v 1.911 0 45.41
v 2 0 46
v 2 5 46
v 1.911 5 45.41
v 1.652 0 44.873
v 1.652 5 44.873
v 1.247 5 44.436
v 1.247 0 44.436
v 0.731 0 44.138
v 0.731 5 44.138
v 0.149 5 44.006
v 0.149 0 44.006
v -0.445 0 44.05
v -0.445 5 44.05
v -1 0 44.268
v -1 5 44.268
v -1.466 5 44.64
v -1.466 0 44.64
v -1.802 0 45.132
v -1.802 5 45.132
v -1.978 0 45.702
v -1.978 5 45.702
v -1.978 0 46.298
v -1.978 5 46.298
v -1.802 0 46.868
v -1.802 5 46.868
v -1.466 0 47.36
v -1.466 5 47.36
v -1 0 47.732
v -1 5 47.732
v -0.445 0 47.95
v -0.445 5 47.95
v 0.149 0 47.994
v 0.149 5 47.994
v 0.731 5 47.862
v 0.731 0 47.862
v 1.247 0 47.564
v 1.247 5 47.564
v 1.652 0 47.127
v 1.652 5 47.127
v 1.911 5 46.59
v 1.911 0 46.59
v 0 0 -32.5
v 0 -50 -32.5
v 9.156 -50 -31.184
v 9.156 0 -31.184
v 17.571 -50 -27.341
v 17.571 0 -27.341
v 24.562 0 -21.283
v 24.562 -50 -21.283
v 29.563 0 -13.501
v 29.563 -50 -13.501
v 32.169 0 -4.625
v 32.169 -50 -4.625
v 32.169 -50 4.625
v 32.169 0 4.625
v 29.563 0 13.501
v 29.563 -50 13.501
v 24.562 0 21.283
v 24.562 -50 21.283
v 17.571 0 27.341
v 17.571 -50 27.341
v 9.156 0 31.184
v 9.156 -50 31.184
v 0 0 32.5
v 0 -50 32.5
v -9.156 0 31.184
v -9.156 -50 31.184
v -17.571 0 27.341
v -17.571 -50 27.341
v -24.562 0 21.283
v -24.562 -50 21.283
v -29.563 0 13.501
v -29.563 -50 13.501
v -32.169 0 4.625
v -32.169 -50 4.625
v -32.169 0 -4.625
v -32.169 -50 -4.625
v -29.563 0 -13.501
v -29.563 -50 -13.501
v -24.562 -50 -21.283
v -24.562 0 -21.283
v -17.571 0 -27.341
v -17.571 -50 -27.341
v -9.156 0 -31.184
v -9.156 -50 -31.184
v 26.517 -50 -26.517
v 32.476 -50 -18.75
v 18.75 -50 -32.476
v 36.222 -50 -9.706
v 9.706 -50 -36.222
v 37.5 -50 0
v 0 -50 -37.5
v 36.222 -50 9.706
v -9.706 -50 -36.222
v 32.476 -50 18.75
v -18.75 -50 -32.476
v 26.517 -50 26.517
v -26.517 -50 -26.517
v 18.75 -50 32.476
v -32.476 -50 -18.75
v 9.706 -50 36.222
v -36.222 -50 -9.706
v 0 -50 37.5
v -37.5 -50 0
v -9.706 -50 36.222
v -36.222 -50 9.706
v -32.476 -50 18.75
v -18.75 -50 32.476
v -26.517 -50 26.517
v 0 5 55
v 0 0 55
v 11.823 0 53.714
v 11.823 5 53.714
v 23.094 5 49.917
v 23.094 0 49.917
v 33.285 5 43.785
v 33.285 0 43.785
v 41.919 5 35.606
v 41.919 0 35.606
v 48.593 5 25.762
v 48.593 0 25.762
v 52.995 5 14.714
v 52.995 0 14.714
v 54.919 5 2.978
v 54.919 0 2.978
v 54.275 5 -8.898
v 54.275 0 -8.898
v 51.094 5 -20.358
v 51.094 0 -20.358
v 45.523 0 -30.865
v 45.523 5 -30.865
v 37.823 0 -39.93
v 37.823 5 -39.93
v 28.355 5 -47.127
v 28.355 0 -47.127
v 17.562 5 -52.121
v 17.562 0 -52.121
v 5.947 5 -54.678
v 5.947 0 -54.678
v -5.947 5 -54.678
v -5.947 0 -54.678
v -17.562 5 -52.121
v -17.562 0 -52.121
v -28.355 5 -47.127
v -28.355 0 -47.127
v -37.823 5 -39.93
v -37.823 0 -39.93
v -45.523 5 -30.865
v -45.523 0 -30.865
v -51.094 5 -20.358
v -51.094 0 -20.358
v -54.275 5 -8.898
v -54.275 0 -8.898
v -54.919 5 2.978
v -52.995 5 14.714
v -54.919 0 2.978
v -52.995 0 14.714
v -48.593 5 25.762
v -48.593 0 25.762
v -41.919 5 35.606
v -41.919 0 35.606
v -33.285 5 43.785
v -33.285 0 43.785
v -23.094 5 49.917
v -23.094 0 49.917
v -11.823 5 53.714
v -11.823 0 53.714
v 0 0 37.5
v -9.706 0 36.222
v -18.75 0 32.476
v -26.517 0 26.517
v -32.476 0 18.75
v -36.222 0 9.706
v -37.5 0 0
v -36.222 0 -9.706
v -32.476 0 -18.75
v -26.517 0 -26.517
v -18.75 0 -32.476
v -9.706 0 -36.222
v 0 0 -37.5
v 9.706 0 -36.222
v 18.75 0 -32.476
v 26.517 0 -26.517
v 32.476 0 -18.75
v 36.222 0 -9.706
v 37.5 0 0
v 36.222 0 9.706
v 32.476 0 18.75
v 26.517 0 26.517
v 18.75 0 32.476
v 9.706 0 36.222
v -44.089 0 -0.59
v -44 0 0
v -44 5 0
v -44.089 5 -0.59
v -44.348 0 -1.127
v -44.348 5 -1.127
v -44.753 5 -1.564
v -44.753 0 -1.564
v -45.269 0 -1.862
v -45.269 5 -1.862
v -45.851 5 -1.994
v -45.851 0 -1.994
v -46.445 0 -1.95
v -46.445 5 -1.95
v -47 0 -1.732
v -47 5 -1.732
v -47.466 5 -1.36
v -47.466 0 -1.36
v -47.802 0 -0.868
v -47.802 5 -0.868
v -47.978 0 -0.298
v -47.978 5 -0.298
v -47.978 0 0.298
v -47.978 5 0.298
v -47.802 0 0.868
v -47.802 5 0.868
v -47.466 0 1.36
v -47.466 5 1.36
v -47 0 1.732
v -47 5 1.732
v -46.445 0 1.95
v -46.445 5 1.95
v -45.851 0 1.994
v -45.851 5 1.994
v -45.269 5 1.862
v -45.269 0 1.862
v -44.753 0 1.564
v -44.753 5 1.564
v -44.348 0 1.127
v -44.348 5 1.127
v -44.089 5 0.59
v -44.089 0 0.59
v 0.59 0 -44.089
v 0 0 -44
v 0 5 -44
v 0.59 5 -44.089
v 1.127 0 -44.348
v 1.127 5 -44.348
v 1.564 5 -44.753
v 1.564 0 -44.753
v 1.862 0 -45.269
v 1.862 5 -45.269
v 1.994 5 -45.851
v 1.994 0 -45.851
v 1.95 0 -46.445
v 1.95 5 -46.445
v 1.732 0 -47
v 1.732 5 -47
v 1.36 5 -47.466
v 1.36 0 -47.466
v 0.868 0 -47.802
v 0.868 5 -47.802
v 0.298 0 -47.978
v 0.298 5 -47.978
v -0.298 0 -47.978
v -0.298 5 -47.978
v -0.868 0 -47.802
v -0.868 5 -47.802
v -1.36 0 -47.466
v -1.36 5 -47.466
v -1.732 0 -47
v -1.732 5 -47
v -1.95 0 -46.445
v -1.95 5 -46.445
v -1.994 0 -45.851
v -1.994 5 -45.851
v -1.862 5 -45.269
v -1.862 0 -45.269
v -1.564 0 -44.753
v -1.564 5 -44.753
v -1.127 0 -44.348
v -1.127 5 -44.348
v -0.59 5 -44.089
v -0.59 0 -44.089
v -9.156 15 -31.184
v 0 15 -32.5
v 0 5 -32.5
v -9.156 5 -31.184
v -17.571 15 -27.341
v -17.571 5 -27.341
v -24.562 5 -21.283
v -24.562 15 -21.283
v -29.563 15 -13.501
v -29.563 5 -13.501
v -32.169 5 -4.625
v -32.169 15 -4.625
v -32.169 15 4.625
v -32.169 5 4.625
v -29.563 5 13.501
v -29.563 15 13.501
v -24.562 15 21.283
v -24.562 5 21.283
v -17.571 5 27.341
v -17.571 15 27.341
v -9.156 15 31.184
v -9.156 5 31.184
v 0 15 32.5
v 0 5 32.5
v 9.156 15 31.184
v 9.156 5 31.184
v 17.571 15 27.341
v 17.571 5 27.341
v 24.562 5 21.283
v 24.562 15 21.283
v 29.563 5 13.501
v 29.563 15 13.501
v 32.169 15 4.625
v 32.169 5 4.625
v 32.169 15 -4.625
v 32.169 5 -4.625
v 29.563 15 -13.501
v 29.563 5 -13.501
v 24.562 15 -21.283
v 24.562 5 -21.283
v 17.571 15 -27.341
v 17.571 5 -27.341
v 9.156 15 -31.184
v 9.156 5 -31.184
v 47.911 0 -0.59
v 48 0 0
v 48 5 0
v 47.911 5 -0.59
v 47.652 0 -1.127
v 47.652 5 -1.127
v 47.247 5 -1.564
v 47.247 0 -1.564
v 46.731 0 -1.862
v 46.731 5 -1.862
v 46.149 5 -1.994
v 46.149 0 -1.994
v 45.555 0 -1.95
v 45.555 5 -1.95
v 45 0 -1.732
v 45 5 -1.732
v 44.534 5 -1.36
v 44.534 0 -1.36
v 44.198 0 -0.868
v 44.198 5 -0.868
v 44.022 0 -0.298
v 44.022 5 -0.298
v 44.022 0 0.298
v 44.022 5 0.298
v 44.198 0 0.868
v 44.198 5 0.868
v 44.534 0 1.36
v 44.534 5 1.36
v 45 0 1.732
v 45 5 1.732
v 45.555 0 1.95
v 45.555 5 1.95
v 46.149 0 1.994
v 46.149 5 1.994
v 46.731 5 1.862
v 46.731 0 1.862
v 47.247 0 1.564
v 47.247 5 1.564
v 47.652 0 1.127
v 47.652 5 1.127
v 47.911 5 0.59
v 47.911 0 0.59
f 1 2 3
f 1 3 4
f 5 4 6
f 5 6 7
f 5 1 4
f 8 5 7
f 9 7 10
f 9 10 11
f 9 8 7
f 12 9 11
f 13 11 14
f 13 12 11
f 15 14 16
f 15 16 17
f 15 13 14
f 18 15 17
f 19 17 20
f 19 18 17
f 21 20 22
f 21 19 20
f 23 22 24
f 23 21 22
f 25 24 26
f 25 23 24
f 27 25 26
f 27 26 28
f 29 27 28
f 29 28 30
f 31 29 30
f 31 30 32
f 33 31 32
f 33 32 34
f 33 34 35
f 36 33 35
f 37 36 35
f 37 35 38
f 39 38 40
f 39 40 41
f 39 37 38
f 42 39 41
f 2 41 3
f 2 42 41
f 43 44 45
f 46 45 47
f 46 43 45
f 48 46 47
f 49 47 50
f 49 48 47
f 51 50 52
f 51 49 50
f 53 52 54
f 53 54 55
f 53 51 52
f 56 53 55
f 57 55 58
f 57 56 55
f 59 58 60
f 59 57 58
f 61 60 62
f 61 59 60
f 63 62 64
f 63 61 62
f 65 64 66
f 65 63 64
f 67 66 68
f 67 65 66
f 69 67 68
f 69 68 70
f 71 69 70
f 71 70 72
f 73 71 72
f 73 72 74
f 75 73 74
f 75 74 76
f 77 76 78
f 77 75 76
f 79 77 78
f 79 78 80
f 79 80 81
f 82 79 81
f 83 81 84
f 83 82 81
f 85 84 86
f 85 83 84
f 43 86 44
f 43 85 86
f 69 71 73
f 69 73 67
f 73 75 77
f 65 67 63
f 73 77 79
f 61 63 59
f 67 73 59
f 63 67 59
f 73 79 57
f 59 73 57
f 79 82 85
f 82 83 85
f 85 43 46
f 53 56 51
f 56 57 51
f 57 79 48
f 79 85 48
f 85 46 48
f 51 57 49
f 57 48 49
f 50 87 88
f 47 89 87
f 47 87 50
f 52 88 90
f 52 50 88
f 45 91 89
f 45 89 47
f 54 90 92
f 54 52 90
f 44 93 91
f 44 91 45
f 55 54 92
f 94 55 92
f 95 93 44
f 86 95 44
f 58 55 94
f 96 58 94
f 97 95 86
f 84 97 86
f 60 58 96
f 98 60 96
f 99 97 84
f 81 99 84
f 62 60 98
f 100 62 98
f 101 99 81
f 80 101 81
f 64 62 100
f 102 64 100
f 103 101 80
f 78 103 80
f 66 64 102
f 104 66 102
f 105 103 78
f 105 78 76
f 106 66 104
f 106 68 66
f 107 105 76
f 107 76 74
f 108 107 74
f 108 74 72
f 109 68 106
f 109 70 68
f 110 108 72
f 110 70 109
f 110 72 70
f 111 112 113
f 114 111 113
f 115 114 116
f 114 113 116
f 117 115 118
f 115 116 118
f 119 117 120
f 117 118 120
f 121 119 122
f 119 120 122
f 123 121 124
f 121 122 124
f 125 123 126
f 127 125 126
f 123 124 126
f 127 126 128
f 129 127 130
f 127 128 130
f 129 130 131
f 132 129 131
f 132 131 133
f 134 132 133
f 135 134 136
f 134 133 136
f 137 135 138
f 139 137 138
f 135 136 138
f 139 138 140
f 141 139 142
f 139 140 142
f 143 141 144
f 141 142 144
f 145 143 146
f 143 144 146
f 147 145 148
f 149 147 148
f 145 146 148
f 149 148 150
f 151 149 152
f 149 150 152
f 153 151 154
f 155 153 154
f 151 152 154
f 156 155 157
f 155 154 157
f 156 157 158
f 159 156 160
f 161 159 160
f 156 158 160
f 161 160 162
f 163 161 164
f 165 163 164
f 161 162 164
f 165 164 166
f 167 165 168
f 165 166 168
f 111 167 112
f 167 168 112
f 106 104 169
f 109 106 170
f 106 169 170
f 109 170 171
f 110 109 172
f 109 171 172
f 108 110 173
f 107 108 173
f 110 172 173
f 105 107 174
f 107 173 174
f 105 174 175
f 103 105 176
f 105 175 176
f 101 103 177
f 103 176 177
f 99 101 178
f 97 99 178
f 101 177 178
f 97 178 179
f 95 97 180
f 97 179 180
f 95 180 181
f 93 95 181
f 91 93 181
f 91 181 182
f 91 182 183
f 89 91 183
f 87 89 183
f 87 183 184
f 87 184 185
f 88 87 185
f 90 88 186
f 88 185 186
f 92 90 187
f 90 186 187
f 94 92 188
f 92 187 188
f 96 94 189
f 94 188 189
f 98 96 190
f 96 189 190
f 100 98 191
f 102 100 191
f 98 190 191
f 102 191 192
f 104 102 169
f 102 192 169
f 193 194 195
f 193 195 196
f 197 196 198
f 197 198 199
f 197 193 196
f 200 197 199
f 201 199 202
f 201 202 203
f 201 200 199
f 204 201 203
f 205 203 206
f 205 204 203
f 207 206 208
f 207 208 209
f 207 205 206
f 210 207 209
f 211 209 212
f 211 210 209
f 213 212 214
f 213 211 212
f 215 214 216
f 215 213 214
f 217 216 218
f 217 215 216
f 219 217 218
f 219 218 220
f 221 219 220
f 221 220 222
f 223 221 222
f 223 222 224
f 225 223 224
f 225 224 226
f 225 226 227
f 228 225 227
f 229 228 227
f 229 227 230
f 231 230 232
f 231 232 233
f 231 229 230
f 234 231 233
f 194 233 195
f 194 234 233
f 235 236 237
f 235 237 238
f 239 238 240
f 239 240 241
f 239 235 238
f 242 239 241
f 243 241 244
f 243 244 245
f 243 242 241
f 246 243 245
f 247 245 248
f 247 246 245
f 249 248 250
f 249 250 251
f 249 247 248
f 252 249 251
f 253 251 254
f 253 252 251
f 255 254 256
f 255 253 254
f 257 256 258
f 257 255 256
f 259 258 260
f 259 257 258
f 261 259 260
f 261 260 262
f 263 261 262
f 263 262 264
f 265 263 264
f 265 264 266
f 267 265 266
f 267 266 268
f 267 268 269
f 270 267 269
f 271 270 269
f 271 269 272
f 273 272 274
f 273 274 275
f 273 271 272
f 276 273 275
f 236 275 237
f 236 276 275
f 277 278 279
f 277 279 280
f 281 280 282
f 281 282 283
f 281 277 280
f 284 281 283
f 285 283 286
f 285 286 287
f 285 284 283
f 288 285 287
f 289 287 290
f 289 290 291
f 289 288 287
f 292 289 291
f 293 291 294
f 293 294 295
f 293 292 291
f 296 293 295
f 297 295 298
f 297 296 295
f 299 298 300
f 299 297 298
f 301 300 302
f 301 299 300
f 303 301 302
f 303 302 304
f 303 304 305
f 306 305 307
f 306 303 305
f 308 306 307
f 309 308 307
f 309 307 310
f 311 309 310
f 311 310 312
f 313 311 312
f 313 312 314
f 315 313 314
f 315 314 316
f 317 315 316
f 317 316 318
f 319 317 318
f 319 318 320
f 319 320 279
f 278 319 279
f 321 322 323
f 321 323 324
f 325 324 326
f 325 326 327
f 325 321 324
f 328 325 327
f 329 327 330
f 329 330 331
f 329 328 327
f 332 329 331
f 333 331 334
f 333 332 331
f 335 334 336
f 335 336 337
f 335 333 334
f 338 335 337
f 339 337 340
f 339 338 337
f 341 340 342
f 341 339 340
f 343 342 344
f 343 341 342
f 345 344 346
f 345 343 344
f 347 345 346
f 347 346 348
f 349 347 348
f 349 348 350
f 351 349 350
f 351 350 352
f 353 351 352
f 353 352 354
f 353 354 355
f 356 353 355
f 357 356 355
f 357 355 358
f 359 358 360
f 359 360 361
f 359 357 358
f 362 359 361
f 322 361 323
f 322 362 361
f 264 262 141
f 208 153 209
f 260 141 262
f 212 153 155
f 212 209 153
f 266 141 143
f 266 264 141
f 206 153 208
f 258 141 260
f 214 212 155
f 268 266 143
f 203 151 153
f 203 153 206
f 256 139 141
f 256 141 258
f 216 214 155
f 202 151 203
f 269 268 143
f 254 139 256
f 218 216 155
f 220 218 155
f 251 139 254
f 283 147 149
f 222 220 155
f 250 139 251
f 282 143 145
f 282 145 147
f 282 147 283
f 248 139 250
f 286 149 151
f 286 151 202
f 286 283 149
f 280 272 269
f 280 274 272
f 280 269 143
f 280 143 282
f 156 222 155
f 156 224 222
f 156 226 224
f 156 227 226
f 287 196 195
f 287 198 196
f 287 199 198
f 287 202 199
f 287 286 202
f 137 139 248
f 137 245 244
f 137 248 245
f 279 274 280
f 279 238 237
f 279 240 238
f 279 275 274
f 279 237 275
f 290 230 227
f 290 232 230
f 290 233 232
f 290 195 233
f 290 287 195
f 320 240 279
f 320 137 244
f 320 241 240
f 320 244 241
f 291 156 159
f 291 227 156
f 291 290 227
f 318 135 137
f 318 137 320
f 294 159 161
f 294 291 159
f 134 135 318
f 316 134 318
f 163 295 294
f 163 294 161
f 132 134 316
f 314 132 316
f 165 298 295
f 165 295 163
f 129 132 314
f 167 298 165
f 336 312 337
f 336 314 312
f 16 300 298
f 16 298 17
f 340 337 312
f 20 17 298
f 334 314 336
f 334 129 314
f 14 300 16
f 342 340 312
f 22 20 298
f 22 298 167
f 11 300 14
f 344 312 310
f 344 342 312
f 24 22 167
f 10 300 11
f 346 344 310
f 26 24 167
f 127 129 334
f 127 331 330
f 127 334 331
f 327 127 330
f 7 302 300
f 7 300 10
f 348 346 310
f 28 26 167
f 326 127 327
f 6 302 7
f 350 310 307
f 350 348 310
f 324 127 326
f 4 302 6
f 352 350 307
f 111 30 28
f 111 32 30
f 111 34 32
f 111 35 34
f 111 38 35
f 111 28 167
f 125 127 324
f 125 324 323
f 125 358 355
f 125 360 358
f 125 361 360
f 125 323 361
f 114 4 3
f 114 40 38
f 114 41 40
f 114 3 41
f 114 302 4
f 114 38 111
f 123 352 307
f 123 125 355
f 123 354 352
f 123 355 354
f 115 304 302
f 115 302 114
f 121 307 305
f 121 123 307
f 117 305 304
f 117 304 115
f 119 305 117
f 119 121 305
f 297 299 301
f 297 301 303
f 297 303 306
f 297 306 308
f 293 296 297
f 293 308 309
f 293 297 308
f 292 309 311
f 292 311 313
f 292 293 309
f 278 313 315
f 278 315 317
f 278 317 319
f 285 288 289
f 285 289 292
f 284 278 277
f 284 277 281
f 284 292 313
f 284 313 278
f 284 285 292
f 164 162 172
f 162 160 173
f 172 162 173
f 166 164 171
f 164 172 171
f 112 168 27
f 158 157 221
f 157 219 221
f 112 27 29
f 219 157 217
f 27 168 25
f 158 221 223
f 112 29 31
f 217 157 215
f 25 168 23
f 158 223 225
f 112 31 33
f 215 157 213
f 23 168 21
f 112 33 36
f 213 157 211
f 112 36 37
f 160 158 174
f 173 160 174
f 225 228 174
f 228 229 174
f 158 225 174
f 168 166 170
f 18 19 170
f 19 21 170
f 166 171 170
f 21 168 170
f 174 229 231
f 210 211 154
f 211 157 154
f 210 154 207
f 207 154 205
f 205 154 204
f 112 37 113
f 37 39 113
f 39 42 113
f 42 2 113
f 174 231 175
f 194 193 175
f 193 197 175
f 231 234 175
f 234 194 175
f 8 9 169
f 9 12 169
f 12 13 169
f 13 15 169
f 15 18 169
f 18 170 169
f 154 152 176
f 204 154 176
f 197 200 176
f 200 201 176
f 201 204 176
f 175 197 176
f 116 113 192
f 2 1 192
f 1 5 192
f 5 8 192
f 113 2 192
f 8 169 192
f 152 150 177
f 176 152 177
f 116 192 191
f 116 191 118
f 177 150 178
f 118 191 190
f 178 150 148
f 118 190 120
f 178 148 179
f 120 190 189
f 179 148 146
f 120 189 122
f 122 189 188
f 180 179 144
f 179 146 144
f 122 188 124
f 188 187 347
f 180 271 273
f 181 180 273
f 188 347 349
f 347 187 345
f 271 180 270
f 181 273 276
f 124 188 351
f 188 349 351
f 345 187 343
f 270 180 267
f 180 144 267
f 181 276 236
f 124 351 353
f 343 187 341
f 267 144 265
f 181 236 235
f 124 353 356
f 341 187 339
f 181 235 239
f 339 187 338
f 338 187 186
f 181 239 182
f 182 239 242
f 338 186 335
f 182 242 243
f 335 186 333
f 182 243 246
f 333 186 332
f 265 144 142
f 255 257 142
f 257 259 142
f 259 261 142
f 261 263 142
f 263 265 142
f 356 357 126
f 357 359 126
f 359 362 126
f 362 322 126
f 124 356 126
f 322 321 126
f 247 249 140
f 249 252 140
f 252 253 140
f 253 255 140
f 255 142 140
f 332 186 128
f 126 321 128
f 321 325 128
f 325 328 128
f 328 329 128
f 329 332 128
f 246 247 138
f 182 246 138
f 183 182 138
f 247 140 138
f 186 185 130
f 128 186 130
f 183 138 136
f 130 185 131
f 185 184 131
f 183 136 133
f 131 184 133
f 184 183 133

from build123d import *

# Parameters (mm, degrees)
SKETCH1_R             = 55
SKETCH1_R_2           = 2
SKETCH1_R_3           = 32.5
BOSS_EXTRUDE1_DEPTH   = 5
SKETCH3_R             = 37.5
SKETCH3_R_2           = 32.5
BOSS_EXTRUDE3_DEPTH   = 50
BOSS_EXTRUDE4_START   = 15
SKETCH1_4_R           = 32.5
BOSS_EXTRUDE4_DEPTH   = 15
CIRPATTERN1_OUTLINE_R = 2
CIRPATTERN1_DEPTH     = 5


# Read off the part's stored shape, not the designer's step: CirPattern1
with BuildPart() as part:
    # Sketch1 → Boss-Extrude1 (new body)
    # profile 1 of 2: a face of its own
    with BuildSketch(Plane(origin=(0, 0, 0), x_dir=(1, 0, 0), z_dir=(0, 1, 0))):
        with Locations(Location((0, 0, 0), (0, 0, 270))):
            Circle(SKETCH1_R)
        with Locations(Location((0, 46, 0), (0, 0, 270))):
            Circle(SKETCH1_R_2, mode=Mode.SUBTRACT)
        Circle(SKETCH1_R_3, mode=Mode.SUBTRACT)
    # profile 2 of 2: a face of its own
    with BuildSketch(Plane(origin=(0, 0, 0), x_dir=(1, 0, 0), z_dir=(0, 1, 0))):
        Circle(SKETCH1_R_3)
    extrude(amount=BOSS_EXTRUDE1_DEPTH)

    # Sketch3 → Boss-Extrude3 (add)
    with BuildSketch(Plane.XZ):
        with Locations(Location((0, 0, 0), (0, 0, 90))):
            Circle(SKETCH3_R)
        with Locations(Location((0, 0, 0), (0, 0, 270))):
            Circle(SKETCH3_R_2, mode=Mode.SUBTRACT)
    extrude(amount=BOSS_EXTRUDE3_DEPTH)

    # Sketch1<4> → Boss-Extrude4 (add)
    with BuildSketch(Plane(origin=(0, 0, 0), x_dir=(1, 0, 0), z_dir=(0, 1, 0)).offset(BOSS_EXTRUDE4_START)):
        with Locations(Location((0, 0, 0), (0, 0, 90))):
            Circle(SKETCH1_4_R)
    extrude(amount=-BOSS_EXTRUDE4_DEPTH)

    # CirPattern1 outline → CirPattern1 (cut)
    with BuildSketch(Plane(origin=(0, 0, 0), x_dir=(1, 0, 0), z_dir=(0, 1, 0))):
        with Locations((46, 0)):
            Circle(CIRPATTERN1_OUTLINE_R)
        with Locations((0, -46)):
            Circle(CIRPATTERN1_OUTLINE_R)
        with Locations((-46, 0)):
            Circle(CIRPATTERN1_OUTLINE_R)
    extrude(amount=CIRPATTERN1_DEPTH, mode=Mode.SUBTRACT)


solid = part.part
